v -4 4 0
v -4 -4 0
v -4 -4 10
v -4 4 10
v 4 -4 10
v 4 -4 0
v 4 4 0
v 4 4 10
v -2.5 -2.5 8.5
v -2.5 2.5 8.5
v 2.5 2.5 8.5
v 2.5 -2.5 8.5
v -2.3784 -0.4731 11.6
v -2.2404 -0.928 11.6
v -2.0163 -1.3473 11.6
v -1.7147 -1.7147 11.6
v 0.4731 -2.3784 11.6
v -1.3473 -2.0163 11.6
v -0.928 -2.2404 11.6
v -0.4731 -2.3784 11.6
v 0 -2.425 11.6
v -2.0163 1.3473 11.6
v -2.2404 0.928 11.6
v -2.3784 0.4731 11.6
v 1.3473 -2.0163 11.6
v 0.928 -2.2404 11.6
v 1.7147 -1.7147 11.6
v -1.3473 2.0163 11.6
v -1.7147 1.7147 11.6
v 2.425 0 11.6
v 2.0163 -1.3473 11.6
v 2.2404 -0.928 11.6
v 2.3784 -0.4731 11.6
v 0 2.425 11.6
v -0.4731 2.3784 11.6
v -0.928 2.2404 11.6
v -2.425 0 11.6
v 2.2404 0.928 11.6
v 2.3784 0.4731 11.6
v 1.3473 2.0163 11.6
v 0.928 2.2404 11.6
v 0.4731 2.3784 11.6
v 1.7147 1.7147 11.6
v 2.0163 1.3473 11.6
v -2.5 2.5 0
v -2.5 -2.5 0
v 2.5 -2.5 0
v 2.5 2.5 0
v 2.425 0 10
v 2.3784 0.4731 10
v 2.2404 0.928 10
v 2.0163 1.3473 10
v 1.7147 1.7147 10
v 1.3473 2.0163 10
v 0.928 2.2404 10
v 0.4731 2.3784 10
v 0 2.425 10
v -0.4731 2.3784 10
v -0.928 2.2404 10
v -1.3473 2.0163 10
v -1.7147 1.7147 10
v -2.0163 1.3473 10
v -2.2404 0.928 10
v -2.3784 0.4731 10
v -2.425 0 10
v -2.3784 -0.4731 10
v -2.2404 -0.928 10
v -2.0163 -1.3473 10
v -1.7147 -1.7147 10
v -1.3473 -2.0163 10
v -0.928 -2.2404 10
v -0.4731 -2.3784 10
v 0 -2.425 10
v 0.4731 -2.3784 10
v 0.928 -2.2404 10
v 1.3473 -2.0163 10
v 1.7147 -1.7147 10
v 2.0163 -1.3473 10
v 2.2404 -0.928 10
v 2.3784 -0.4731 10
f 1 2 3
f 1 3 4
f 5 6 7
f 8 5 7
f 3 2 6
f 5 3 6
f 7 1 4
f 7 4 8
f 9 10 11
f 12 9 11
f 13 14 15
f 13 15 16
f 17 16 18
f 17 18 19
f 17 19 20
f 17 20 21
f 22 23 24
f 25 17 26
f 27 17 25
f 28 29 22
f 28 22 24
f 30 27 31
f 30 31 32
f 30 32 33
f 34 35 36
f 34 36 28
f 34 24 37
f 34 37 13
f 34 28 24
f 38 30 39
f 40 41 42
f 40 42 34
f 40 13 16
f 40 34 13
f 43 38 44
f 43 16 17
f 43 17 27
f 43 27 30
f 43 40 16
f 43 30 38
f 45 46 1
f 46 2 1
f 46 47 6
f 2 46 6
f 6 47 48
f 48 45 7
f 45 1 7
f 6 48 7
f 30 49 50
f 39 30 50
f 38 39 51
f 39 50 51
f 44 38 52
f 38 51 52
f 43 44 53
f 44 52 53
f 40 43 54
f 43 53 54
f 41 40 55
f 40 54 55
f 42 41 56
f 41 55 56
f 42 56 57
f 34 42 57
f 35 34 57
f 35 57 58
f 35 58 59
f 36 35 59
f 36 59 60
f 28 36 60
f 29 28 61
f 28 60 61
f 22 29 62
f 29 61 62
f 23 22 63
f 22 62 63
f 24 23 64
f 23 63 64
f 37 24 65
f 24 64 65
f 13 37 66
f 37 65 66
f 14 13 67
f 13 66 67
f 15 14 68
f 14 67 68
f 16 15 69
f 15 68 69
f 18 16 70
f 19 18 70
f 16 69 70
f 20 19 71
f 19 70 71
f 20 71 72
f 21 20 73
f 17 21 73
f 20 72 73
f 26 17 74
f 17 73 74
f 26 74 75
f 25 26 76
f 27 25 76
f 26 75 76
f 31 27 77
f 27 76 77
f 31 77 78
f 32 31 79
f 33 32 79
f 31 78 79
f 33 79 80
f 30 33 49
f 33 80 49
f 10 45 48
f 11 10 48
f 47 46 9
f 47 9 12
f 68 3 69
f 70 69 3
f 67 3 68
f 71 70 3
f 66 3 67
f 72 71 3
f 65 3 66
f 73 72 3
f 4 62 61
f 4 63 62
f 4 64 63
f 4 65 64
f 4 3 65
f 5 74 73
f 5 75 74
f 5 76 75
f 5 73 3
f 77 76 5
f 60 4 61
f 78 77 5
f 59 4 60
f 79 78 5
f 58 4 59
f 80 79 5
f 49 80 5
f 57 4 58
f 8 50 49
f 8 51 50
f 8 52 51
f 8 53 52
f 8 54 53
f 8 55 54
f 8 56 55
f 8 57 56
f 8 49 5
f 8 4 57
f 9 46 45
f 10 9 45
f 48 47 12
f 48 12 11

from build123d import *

# Parameters (mm, degrees)
F0_W     = 8
F0_H     = 8
F1_DEPTH = 10
F2_T     = -1.5
F3_R     = 2.425
F4_DEPTH = 1.6


with BuildPart() as f1:
    # F0 (on Top) → F1 (new body)
    with BuildSketch(Plane.XY):
        Rectangle(F0_W, F0_H)
    extrude(amount=F1_DEPTH)

    # F2
    f2_openings = [f1.faces().sort_by_distance(p)[0] for p in [
        (0, 0, 0),
    ]]
    offset(amount=F2_T, openings=f2_openings)

    # F3 (on face) → F4 (join)
    with BuildSketch(Plane.XY.offset(10)):
        Circle(F3_R)
    extrude(amount=F4_DEPTH)


solid = f1.part
